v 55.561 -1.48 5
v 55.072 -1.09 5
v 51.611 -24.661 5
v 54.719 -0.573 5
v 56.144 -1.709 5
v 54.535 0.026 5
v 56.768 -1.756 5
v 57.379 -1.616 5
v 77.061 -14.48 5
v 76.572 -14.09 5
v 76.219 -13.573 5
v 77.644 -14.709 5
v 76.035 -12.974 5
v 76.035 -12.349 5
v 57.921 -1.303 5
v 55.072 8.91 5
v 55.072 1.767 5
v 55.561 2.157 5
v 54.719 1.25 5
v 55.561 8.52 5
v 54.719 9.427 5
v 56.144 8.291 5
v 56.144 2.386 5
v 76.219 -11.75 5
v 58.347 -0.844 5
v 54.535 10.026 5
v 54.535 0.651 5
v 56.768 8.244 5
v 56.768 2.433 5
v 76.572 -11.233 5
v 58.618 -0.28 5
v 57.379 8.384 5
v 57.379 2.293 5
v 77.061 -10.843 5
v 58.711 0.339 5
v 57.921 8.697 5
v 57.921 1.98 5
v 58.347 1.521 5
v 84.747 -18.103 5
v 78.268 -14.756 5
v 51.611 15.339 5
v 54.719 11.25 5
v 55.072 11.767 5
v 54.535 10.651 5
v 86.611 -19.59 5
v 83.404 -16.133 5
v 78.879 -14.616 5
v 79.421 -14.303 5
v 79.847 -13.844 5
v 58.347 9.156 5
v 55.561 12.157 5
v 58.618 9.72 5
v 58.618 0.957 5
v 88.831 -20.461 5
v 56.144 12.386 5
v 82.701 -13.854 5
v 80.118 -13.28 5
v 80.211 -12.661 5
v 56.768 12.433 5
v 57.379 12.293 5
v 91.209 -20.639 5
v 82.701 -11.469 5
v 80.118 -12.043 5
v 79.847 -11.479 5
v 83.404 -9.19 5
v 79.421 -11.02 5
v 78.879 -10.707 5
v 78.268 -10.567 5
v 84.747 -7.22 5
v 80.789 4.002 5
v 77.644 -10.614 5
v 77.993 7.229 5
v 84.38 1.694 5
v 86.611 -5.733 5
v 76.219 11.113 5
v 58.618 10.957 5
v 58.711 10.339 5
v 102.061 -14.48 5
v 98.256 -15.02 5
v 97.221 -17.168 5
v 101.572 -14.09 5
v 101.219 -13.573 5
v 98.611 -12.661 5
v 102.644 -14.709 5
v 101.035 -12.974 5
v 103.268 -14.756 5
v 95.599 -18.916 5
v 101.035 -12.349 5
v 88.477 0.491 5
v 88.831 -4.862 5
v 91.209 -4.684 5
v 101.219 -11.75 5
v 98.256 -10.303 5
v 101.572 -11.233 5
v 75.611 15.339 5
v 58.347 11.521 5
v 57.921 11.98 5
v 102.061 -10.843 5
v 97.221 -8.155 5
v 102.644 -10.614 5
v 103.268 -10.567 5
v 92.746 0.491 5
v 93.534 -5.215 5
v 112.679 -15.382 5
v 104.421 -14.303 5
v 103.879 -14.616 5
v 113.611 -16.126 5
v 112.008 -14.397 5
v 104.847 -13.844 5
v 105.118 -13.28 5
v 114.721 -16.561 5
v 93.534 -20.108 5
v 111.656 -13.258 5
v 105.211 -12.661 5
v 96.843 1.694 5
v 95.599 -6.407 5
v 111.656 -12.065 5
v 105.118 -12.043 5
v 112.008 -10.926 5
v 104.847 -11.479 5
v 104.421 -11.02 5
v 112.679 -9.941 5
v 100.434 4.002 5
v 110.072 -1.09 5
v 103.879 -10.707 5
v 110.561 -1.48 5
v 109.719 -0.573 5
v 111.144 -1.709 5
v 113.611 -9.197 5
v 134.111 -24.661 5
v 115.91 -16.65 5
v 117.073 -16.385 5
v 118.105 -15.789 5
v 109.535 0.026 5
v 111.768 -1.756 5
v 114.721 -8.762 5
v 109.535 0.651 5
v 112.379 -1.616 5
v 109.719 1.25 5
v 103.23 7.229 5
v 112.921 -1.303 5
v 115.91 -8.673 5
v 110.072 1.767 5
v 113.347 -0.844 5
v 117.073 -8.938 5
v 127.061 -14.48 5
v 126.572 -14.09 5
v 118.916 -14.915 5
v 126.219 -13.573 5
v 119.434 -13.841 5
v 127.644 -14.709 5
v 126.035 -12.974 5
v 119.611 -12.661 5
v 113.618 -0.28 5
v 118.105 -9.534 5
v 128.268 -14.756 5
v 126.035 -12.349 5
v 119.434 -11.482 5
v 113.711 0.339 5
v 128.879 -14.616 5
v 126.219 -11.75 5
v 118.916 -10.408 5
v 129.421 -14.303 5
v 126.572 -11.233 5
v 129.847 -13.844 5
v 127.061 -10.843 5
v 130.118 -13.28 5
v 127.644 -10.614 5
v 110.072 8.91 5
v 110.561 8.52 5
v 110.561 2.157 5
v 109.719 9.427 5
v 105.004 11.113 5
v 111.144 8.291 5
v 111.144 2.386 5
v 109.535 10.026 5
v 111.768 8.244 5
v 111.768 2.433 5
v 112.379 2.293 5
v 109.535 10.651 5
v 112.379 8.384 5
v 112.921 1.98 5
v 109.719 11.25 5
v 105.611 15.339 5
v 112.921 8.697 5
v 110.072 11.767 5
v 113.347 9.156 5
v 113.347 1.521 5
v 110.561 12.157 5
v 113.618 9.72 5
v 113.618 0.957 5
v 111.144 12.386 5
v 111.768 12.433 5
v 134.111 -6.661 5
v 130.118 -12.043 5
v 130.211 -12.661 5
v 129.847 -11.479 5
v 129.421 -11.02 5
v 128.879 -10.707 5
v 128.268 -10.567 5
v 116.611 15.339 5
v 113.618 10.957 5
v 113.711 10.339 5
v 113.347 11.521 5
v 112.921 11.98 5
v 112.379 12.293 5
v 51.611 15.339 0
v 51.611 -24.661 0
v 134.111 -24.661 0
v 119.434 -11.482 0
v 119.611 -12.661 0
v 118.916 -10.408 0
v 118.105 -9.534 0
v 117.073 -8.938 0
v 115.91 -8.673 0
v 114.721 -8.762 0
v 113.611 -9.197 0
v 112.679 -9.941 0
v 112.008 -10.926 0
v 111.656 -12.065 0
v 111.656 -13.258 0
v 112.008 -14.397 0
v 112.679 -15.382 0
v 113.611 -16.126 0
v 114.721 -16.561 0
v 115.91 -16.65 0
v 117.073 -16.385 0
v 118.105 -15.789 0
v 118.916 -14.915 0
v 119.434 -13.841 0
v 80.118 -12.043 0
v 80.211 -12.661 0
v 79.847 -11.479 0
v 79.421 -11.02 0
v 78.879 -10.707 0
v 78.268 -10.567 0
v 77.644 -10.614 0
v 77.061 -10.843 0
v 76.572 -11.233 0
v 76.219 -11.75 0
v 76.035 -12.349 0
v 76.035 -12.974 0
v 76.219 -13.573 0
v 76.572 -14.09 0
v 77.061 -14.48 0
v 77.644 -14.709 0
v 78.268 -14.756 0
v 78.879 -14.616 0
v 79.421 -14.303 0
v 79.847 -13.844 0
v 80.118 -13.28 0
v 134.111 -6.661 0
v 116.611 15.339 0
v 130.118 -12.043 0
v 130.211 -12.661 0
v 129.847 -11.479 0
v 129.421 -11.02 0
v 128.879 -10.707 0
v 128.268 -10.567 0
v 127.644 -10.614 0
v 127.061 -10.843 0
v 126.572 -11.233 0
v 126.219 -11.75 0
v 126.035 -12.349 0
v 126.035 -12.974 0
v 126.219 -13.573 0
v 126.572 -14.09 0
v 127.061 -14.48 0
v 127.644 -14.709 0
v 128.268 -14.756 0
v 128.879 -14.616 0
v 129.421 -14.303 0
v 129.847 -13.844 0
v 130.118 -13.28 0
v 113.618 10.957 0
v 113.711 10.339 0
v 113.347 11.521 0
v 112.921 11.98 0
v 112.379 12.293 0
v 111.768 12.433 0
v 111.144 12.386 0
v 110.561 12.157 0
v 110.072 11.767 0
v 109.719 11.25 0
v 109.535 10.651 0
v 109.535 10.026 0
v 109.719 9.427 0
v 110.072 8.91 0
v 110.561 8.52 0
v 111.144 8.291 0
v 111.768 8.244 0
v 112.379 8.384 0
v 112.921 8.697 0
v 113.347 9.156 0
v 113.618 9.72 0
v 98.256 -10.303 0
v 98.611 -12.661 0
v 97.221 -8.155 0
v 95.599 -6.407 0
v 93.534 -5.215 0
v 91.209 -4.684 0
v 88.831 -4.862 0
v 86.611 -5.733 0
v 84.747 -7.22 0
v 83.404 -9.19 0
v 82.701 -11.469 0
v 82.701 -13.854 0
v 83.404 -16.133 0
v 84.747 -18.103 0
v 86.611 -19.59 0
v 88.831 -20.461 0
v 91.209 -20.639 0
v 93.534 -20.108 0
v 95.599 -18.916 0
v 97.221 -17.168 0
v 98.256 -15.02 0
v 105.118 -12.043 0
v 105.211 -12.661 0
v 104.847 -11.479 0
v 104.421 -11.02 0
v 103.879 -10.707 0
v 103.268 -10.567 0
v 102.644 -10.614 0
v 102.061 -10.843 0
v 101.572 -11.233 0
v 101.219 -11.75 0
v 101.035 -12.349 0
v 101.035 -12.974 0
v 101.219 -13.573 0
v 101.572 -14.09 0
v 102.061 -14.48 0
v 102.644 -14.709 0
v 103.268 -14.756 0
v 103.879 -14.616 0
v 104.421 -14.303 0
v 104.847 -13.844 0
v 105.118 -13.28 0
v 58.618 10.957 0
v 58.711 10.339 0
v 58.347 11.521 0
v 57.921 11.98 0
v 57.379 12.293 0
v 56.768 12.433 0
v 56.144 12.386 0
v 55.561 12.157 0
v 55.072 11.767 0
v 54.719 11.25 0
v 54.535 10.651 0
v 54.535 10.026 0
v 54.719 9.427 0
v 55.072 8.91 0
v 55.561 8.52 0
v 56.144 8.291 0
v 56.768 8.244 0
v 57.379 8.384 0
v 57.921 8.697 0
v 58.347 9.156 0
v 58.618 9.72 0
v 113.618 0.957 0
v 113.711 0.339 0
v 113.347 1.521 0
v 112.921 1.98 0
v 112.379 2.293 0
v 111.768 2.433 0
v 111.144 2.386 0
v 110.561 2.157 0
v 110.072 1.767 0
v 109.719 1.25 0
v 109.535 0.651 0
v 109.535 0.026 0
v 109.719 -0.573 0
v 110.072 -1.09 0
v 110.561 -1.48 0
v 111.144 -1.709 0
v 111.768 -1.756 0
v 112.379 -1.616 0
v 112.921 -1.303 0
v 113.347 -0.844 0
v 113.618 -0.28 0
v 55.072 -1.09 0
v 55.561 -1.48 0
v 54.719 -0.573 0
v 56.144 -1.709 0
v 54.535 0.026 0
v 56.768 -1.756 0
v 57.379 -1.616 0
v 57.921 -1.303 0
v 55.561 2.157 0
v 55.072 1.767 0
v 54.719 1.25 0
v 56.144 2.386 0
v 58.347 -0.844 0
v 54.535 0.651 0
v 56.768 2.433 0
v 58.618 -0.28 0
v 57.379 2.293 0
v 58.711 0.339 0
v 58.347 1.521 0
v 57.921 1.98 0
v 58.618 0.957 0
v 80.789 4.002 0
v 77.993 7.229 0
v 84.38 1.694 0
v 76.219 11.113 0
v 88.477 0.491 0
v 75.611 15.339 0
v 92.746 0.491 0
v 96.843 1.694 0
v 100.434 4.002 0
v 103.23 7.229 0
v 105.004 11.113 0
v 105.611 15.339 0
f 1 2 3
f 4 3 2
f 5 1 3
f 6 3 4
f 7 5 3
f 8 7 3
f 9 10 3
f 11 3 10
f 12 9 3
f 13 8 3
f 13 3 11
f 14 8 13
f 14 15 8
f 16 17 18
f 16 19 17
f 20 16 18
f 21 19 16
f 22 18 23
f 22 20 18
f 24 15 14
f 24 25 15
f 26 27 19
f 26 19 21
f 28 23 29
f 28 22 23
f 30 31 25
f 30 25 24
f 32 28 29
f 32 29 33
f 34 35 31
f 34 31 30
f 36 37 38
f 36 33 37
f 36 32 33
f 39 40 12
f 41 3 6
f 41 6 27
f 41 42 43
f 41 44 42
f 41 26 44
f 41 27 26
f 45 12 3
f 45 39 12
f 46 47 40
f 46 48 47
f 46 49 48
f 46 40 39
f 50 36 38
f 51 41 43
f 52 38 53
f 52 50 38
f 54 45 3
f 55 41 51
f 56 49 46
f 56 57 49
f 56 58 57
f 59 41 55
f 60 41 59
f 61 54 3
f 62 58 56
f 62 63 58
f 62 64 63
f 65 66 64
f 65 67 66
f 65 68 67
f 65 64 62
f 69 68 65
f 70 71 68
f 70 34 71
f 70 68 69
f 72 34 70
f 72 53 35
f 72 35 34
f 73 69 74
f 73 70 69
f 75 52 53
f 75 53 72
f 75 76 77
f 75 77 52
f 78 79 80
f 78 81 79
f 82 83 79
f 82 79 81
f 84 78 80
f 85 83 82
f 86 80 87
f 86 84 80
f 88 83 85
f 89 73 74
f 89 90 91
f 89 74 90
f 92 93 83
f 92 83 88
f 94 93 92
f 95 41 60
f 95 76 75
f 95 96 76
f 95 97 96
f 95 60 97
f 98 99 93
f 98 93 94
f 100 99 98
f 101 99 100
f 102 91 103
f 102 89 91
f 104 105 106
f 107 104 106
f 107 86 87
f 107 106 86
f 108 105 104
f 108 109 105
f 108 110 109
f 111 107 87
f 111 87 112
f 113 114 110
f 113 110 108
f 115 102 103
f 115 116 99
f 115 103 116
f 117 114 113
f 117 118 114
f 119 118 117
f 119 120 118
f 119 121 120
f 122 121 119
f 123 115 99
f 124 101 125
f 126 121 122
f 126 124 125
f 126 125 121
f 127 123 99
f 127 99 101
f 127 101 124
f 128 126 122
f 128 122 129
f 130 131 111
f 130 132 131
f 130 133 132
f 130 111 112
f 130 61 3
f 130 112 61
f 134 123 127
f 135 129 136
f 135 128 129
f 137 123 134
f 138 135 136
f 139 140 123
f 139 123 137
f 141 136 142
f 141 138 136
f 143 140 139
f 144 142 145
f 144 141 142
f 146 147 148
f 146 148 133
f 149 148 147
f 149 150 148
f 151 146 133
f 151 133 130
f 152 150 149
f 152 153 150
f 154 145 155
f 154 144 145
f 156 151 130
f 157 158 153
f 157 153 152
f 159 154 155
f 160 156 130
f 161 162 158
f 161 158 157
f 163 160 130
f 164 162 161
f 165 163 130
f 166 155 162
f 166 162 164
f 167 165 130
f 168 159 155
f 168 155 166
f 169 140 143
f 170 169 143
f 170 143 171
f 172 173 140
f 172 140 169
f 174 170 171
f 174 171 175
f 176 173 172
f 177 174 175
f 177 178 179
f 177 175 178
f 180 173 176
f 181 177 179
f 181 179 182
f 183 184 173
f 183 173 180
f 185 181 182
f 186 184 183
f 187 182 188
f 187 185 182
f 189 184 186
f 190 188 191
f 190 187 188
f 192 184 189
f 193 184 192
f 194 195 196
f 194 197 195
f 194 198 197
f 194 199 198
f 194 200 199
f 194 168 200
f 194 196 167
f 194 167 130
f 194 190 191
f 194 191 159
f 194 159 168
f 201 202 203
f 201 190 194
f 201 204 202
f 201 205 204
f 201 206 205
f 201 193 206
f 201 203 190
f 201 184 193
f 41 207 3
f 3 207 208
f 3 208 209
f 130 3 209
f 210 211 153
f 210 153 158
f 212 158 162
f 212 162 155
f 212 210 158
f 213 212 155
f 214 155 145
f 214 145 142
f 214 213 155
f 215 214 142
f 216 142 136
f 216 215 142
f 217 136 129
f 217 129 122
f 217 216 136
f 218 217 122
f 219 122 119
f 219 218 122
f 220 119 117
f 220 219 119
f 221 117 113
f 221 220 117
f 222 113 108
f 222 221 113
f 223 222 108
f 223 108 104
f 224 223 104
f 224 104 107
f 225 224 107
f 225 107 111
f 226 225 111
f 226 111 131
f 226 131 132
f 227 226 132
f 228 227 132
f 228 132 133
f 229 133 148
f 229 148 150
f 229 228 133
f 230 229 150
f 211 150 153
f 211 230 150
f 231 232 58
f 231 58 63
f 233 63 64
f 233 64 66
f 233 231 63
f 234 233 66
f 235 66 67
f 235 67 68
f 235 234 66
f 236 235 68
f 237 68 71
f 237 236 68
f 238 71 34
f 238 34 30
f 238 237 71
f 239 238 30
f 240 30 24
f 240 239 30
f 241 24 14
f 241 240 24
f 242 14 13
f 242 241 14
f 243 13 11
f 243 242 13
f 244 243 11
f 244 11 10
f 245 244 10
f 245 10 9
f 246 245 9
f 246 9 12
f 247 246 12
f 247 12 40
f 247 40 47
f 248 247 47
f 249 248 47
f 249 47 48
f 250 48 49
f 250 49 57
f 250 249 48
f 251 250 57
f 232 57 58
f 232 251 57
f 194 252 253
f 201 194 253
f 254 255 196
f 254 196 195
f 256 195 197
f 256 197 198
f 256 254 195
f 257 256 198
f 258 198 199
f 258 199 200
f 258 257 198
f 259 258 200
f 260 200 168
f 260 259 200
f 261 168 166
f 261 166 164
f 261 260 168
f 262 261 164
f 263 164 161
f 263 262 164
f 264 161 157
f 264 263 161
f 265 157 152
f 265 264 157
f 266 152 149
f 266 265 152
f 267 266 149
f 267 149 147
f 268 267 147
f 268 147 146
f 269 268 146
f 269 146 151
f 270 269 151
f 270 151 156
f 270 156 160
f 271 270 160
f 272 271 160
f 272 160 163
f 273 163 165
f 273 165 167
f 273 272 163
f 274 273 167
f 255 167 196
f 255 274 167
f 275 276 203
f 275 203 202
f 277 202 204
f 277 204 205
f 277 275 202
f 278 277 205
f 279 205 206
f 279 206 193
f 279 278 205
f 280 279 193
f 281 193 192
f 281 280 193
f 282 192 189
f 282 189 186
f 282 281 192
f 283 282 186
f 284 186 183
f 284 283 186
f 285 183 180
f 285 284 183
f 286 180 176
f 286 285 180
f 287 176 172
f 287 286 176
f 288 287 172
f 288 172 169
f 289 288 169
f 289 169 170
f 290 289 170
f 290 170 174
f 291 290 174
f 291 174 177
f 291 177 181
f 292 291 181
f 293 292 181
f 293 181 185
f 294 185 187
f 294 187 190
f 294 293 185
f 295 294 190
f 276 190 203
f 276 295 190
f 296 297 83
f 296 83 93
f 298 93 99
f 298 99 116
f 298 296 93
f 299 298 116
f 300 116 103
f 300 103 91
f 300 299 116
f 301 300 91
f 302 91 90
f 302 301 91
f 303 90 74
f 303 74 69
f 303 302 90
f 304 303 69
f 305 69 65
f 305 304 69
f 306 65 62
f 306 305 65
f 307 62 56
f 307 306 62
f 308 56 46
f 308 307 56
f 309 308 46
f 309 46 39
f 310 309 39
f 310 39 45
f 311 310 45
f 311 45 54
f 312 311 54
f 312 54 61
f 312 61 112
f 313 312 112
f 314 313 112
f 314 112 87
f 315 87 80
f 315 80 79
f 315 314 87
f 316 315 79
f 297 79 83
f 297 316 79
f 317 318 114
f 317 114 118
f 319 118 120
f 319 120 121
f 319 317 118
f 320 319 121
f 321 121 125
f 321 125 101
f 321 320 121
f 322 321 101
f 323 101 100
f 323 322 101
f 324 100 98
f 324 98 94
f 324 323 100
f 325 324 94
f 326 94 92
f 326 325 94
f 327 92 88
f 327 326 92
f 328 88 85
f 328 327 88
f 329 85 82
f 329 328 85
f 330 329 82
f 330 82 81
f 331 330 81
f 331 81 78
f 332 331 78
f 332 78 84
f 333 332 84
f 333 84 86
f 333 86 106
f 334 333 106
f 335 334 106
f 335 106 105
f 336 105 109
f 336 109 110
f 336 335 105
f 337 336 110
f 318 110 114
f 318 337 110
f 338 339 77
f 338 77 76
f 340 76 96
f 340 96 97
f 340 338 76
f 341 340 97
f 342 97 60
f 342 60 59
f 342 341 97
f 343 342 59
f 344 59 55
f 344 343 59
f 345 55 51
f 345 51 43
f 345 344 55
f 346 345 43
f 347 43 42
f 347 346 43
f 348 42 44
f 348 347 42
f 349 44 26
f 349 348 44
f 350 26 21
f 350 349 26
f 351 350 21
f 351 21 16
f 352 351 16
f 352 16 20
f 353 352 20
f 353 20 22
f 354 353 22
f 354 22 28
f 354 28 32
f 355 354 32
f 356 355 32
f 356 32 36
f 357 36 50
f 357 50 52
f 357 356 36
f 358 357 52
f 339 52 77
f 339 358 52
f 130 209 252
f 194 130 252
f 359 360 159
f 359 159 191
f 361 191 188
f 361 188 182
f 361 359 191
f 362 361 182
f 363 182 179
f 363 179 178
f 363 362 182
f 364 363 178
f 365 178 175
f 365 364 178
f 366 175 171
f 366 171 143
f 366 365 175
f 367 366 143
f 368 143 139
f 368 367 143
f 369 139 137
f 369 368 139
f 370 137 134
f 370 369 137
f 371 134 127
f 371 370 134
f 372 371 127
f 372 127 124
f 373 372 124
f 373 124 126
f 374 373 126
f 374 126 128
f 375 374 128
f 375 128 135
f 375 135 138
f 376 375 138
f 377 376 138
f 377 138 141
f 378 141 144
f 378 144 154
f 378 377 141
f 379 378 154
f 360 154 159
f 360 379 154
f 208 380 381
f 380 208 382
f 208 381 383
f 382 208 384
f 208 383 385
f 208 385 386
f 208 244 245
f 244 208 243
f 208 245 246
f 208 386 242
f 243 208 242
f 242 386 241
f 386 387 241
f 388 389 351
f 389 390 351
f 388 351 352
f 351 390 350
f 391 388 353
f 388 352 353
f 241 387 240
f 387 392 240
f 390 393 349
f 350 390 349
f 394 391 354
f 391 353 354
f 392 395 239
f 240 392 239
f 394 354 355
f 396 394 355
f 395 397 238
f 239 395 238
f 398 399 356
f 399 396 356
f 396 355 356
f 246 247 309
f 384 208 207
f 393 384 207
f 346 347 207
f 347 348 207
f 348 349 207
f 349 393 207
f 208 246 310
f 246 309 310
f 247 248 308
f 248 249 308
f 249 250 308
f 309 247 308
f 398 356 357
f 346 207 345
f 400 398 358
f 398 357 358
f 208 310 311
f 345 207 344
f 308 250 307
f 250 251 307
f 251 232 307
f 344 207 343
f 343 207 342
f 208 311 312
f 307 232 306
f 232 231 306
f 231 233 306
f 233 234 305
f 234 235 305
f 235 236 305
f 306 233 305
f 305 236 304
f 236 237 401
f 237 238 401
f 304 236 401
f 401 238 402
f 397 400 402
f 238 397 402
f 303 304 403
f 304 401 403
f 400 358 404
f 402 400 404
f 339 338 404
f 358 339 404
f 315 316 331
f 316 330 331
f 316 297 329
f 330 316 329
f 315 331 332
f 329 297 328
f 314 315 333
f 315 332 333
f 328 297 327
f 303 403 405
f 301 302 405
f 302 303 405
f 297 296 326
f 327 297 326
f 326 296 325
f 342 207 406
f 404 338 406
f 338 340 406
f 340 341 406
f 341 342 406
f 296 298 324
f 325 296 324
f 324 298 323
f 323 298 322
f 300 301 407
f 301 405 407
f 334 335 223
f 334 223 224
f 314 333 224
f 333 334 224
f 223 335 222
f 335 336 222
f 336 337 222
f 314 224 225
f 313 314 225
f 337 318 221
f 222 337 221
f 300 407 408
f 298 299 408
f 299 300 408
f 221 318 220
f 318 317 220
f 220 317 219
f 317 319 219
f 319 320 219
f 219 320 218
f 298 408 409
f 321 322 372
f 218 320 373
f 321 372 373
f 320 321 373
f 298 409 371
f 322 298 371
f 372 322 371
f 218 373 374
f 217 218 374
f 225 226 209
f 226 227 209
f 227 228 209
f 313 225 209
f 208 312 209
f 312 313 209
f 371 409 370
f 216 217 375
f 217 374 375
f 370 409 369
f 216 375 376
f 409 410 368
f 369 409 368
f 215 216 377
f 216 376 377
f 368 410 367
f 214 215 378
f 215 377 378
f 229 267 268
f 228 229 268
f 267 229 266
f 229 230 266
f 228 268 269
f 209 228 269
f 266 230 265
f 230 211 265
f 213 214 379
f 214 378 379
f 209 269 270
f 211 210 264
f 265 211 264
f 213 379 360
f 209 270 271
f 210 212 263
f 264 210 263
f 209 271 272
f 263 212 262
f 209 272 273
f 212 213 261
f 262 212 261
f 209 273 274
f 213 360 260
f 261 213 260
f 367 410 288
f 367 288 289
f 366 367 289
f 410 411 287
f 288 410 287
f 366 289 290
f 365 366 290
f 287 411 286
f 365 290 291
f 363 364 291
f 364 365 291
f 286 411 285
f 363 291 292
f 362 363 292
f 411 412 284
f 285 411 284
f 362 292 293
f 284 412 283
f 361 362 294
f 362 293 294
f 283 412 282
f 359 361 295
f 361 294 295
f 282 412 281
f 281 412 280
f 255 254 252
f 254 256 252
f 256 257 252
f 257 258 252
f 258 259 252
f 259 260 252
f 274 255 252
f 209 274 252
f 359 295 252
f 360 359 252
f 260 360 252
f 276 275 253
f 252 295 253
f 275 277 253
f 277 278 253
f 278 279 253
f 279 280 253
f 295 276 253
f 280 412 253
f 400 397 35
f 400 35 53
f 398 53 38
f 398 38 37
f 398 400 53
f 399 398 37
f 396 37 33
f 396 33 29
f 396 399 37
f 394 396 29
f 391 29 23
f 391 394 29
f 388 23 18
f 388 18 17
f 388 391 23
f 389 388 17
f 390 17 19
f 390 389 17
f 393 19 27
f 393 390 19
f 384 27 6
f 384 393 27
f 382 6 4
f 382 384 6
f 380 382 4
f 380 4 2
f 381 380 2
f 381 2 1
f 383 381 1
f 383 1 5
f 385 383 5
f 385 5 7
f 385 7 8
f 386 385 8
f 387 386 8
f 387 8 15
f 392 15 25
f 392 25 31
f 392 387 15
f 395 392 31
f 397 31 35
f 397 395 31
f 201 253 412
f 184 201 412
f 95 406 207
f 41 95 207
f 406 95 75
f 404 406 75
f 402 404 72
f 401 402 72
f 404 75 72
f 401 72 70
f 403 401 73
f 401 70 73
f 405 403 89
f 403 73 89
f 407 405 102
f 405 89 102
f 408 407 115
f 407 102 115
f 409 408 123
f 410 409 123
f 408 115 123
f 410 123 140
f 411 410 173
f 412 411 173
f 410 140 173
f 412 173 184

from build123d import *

# Parameters (mm, degrees)
SKETCH1_R           = 2.1
SKETCH1_R_2         = 4
SKETCH1_R_3         = 8
BOSS_EXTRUDE1_DEPTH = 5
SKETCH2_R           = 15
CUT_EXTRUDE1_DEPTH  = 10


with BuildPart() as part:
    # Sketch1 → Boss-Extrude1 (new body)
    with BuildSketch(Plane.XY):
        Polygon((116.611470678, 15.338509317), (51.611470678, 15.338509317), (51.611470678, -6.661490683), (51.611470678, -24.661490683), (116.611470678, -24.661490683), (134.111470678, -24.661490683), (134.111470678, -6.661490683), align=None)
        with Locations((56.611470678, 10.338509317)):
            Circle(SKETCH1_R, mode=Mode.SUBTRACT)
        with Locations((111.611470678, 10.338509317)):
            Circle(SKETCH1_R, mode=Mode.SUBTRACT)
        with Locations((56.611470678, 0.338509317)):
            Circle(SKETCH1_R, mode=Mode.SUBTRACT)
        with Locations((111.611470678, 0.338509317)):
            Circle(SKETCH1_R, mode=Mode.SUBTRACT)
        with Locations((115.611470678, -12.661490683)):
            Circle(SKETCH1_R_2, mode=Mode.SUBTRACT)
        with Locations((90.611470678, -12.661490683)):
            Circle(SKETCH1_R_3, mode=Mode.SUBTRACT)
        with Locations((78.111470678, -12.661490683)):
            Circle(SKETCH1_R, mode=Mode.SUBTRACT)
        with Locations((103.111470678, -12.661490683)):
            Circle(SKETCH1_R, mode=Mode.SUBTRACT)
        with Locations((128.111470678, -12.661490683)):
            Circle(SKETCH1_R, mode=Mode.SUBTRACT)
    extrude(amount=BOSS_EXTRUDE1_DEPTH)

    # Sketch2 → Cut-Extrude1 (cut)
    with BuildSketch(Plane.XY.offset(5)):
        with Locations((90.611470678, 15.338509317)):
            Circle(SKETCH2_R)
    extrude(amount=-CUT_EXTRUDE1_DEPTH, mode=Mode.SUBTRACT)


solid = part.part
